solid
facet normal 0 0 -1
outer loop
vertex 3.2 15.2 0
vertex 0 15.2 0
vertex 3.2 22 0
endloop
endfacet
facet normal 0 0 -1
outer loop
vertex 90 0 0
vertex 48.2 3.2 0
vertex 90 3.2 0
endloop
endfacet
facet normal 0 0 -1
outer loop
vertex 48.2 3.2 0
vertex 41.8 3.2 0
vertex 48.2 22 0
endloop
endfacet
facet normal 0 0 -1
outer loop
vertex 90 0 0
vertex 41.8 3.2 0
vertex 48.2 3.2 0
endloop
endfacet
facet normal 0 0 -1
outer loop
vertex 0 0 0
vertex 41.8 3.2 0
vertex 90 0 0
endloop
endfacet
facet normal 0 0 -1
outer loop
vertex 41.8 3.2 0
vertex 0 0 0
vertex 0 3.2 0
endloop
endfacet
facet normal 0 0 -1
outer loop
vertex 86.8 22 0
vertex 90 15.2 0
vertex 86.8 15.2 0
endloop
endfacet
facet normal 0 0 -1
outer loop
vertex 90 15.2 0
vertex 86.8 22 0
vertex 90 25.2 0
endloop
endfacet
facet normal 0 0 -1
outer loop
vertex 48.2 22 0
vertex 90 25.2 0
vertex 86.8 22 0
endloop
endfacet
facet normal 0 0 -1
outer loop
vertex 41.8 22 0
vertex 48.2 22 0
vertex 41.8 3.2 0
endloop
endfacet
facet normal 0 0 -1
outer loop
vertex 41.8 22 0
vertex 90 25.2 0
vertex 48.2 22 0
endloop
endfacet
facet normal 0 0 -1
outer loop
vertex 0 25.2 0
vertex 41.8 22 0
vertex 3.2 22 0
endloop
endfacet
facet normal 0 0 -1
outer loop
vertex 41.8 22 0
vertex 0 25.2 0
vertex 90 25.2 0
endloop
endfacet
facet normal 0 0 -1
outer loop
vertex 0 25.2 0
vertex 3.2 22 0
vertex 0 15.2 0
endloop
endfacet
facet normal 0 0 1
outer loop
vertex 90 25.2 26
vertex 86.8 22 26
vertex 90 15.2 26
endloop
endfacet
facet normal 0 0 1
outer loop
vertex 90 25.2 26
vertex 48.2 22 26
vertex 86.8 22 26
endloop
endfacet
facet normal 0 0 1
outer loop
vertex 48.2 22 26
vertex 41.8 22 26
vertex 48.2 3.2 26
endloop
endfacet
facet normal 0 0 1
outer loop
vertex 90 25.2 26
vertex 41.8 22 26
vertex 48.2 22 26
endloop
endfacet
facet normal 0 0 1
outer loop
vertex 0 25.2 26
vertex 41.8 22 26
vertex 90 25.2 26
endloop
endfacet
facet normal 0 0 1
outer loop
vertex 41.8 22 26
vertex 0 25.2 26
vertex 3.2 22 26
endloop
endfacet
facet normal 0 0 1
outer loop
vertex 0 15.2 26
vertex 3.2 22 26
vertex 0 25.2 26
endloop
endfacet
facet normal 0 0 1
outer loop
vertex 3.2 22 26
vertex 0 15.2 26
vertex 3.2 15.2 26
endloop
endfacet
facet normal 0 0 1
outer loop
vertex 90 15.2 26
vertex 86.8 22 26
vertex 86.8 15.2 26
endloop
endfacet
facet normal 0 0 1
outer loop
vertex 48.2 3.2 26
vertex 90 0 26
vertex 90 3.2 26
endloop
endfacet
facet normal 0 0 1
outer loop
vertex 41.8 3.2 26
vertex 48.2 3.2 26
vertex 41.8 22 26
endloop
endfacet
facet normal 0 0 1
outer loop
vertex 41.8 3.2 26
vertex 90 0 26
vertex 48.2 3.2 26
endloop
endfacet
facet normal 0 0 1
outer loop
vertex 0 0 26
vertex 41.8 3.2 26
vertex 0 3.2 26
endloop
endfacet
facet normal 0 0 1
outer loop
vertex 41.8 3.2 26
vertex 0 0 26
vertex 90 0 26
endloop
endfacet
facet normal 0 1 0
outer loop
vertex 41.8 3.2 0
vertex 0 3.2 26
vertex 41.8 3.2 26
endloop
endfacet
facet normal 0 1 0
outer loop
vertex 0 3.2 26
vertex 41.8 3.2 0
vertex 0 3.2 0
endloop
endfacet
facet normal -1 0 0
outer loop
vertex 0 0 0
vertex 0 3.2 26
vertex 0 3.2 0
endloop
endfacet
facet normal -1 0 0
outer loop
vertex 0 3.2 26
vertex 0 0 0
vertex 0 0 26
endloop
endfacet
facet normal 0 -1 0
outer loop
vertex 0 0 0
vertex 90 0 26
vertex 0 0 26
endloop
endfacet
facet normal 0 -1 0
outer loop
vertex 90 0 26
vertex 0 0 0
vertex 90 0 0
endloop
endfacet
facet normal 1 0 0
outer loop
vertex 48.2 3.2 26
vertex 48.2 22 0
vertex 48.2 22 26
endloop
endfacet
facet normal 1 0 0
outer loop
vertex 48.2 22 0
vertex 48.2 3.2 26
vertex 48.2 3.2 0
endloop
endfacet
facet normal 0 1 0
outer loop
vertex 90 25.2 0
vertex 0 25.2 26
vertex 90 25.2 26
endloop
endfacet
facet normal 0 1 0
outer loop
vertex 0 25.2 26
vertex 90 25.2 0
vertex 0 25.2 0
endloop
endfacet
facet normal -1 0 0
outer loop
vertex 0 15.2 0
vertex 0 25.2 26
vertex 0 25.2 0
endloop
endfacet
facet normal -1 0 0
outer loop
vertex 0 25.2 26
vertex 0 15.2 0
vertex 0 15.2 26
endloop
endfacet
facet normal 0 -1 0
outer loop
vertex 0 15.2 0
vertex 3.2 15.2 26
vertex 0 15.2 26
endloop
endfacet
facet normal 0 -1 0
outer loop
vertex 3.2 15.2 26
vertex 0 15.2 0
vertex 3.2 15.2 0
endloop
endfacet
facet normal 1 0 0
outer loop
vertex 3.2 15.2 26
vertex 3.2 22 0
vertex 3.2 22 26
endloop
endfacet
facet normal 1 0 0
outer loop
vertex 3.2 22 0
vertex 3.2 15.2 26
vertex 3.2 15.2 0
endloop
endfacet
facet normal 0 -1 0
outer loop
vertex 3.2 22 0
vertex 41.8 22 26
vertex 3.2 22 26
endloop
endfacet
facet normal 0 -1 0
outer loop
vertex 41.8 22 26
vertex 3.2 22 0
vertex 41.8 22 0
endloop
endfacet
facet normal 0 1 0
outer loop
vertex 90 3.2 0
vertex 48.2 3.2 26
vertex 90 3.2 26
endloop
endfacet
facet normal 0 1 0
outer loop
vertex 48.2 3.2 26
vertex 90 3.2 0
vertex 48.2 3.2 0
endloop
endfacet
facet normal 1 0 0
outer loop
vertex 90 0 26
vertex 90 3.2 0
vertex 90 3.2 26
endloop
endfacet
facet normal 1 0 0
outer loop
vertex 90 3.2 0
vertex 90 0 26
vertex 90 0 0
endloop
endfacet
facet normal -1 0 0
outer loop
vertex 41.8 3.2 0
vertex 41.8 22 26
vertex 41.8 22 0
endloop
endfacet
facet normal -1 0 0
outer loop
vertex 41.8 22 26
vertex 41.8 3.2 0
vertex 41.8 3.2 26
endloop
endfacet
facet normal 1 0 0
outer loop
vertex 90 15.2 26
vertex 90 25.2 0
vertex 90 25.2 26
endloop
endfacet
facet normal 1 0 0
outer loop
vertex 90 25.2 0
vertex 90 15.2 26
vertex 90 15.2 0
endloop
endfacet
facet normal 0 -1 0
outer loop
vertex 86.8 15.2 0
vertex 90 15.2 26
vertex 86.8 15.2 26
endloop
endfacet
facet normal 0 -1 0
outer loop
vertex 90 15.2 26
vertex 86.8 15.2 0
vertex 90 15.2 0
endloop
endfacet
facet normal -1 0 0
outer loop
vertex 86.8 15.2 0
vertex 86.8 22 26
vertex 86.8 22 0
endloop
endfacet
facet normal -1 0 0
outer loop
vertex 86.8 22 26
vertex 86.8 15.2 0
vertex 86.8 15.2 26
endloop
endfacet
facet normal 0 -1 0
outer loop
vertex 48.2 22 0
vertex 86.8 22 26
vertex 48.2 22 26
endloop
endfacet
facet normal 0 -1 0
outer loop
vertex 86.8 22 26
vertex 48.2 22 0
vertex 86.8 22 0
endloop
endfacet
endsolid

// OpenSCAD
length = 45;
depth = 22;
gap = 12;

line_width = 0.4 * 8;

z_width = 26;

module hook (length, depth, gap, line_width, z_width) {
linear_extrude(z_width) {
union() {
    // top
square([length, line_width]);
translate([length, 0,0 ])  square([line_width, depth]);
translate([0, depth,0 ])  square([length+line_width, line_width]);
translate([0, gap+line_width, 0]) square([line_width, depth-gap]);
}
};
}


union() {
hook(length, depth, gap, line_width, z_width);
rotate([0, 180, 0]) translate([-length*2,0,-z_width]) hook(length, depth, gap, line_width, z_width);
}

// translate([0,depth,0]) {
// union() {
// hook(length, depth, gap, line_width, z_width);
// rotate([0, 180, 0]) translate([-length*2,0,-z_width]) hook(length, depth, gap, line_width, z_width);

// }}




// 
module hookdiag (length, depth, gap, line_width, z_width) {
difference() {
linear_extrude(z_width) {
union() {
    // top
square([length, line_width]);
translate([length, 0,0 ])  square([line_width, depth]);
translate([0, depth,0 ])  square([length+line_width, line_width]);
translate([0, gap+line_width, 0]) square([line_width, depth-gap]);
}
};
for (i = [-line_width*5 : ceil(line_width * 2): ceil(length*2)]) {
    translate([0, line_width+depth, 0]) intersection() {
    rotate([90, 0, 0]) linear_extrude(line_width*2) offset(-line_width) {square([length, z_width]);}
    translate([i, 0, 0]) rotate([90, 30, 0]) linear_extrude(line_width*2)  square([line_width, z_width*2]);
    }};
};
}
